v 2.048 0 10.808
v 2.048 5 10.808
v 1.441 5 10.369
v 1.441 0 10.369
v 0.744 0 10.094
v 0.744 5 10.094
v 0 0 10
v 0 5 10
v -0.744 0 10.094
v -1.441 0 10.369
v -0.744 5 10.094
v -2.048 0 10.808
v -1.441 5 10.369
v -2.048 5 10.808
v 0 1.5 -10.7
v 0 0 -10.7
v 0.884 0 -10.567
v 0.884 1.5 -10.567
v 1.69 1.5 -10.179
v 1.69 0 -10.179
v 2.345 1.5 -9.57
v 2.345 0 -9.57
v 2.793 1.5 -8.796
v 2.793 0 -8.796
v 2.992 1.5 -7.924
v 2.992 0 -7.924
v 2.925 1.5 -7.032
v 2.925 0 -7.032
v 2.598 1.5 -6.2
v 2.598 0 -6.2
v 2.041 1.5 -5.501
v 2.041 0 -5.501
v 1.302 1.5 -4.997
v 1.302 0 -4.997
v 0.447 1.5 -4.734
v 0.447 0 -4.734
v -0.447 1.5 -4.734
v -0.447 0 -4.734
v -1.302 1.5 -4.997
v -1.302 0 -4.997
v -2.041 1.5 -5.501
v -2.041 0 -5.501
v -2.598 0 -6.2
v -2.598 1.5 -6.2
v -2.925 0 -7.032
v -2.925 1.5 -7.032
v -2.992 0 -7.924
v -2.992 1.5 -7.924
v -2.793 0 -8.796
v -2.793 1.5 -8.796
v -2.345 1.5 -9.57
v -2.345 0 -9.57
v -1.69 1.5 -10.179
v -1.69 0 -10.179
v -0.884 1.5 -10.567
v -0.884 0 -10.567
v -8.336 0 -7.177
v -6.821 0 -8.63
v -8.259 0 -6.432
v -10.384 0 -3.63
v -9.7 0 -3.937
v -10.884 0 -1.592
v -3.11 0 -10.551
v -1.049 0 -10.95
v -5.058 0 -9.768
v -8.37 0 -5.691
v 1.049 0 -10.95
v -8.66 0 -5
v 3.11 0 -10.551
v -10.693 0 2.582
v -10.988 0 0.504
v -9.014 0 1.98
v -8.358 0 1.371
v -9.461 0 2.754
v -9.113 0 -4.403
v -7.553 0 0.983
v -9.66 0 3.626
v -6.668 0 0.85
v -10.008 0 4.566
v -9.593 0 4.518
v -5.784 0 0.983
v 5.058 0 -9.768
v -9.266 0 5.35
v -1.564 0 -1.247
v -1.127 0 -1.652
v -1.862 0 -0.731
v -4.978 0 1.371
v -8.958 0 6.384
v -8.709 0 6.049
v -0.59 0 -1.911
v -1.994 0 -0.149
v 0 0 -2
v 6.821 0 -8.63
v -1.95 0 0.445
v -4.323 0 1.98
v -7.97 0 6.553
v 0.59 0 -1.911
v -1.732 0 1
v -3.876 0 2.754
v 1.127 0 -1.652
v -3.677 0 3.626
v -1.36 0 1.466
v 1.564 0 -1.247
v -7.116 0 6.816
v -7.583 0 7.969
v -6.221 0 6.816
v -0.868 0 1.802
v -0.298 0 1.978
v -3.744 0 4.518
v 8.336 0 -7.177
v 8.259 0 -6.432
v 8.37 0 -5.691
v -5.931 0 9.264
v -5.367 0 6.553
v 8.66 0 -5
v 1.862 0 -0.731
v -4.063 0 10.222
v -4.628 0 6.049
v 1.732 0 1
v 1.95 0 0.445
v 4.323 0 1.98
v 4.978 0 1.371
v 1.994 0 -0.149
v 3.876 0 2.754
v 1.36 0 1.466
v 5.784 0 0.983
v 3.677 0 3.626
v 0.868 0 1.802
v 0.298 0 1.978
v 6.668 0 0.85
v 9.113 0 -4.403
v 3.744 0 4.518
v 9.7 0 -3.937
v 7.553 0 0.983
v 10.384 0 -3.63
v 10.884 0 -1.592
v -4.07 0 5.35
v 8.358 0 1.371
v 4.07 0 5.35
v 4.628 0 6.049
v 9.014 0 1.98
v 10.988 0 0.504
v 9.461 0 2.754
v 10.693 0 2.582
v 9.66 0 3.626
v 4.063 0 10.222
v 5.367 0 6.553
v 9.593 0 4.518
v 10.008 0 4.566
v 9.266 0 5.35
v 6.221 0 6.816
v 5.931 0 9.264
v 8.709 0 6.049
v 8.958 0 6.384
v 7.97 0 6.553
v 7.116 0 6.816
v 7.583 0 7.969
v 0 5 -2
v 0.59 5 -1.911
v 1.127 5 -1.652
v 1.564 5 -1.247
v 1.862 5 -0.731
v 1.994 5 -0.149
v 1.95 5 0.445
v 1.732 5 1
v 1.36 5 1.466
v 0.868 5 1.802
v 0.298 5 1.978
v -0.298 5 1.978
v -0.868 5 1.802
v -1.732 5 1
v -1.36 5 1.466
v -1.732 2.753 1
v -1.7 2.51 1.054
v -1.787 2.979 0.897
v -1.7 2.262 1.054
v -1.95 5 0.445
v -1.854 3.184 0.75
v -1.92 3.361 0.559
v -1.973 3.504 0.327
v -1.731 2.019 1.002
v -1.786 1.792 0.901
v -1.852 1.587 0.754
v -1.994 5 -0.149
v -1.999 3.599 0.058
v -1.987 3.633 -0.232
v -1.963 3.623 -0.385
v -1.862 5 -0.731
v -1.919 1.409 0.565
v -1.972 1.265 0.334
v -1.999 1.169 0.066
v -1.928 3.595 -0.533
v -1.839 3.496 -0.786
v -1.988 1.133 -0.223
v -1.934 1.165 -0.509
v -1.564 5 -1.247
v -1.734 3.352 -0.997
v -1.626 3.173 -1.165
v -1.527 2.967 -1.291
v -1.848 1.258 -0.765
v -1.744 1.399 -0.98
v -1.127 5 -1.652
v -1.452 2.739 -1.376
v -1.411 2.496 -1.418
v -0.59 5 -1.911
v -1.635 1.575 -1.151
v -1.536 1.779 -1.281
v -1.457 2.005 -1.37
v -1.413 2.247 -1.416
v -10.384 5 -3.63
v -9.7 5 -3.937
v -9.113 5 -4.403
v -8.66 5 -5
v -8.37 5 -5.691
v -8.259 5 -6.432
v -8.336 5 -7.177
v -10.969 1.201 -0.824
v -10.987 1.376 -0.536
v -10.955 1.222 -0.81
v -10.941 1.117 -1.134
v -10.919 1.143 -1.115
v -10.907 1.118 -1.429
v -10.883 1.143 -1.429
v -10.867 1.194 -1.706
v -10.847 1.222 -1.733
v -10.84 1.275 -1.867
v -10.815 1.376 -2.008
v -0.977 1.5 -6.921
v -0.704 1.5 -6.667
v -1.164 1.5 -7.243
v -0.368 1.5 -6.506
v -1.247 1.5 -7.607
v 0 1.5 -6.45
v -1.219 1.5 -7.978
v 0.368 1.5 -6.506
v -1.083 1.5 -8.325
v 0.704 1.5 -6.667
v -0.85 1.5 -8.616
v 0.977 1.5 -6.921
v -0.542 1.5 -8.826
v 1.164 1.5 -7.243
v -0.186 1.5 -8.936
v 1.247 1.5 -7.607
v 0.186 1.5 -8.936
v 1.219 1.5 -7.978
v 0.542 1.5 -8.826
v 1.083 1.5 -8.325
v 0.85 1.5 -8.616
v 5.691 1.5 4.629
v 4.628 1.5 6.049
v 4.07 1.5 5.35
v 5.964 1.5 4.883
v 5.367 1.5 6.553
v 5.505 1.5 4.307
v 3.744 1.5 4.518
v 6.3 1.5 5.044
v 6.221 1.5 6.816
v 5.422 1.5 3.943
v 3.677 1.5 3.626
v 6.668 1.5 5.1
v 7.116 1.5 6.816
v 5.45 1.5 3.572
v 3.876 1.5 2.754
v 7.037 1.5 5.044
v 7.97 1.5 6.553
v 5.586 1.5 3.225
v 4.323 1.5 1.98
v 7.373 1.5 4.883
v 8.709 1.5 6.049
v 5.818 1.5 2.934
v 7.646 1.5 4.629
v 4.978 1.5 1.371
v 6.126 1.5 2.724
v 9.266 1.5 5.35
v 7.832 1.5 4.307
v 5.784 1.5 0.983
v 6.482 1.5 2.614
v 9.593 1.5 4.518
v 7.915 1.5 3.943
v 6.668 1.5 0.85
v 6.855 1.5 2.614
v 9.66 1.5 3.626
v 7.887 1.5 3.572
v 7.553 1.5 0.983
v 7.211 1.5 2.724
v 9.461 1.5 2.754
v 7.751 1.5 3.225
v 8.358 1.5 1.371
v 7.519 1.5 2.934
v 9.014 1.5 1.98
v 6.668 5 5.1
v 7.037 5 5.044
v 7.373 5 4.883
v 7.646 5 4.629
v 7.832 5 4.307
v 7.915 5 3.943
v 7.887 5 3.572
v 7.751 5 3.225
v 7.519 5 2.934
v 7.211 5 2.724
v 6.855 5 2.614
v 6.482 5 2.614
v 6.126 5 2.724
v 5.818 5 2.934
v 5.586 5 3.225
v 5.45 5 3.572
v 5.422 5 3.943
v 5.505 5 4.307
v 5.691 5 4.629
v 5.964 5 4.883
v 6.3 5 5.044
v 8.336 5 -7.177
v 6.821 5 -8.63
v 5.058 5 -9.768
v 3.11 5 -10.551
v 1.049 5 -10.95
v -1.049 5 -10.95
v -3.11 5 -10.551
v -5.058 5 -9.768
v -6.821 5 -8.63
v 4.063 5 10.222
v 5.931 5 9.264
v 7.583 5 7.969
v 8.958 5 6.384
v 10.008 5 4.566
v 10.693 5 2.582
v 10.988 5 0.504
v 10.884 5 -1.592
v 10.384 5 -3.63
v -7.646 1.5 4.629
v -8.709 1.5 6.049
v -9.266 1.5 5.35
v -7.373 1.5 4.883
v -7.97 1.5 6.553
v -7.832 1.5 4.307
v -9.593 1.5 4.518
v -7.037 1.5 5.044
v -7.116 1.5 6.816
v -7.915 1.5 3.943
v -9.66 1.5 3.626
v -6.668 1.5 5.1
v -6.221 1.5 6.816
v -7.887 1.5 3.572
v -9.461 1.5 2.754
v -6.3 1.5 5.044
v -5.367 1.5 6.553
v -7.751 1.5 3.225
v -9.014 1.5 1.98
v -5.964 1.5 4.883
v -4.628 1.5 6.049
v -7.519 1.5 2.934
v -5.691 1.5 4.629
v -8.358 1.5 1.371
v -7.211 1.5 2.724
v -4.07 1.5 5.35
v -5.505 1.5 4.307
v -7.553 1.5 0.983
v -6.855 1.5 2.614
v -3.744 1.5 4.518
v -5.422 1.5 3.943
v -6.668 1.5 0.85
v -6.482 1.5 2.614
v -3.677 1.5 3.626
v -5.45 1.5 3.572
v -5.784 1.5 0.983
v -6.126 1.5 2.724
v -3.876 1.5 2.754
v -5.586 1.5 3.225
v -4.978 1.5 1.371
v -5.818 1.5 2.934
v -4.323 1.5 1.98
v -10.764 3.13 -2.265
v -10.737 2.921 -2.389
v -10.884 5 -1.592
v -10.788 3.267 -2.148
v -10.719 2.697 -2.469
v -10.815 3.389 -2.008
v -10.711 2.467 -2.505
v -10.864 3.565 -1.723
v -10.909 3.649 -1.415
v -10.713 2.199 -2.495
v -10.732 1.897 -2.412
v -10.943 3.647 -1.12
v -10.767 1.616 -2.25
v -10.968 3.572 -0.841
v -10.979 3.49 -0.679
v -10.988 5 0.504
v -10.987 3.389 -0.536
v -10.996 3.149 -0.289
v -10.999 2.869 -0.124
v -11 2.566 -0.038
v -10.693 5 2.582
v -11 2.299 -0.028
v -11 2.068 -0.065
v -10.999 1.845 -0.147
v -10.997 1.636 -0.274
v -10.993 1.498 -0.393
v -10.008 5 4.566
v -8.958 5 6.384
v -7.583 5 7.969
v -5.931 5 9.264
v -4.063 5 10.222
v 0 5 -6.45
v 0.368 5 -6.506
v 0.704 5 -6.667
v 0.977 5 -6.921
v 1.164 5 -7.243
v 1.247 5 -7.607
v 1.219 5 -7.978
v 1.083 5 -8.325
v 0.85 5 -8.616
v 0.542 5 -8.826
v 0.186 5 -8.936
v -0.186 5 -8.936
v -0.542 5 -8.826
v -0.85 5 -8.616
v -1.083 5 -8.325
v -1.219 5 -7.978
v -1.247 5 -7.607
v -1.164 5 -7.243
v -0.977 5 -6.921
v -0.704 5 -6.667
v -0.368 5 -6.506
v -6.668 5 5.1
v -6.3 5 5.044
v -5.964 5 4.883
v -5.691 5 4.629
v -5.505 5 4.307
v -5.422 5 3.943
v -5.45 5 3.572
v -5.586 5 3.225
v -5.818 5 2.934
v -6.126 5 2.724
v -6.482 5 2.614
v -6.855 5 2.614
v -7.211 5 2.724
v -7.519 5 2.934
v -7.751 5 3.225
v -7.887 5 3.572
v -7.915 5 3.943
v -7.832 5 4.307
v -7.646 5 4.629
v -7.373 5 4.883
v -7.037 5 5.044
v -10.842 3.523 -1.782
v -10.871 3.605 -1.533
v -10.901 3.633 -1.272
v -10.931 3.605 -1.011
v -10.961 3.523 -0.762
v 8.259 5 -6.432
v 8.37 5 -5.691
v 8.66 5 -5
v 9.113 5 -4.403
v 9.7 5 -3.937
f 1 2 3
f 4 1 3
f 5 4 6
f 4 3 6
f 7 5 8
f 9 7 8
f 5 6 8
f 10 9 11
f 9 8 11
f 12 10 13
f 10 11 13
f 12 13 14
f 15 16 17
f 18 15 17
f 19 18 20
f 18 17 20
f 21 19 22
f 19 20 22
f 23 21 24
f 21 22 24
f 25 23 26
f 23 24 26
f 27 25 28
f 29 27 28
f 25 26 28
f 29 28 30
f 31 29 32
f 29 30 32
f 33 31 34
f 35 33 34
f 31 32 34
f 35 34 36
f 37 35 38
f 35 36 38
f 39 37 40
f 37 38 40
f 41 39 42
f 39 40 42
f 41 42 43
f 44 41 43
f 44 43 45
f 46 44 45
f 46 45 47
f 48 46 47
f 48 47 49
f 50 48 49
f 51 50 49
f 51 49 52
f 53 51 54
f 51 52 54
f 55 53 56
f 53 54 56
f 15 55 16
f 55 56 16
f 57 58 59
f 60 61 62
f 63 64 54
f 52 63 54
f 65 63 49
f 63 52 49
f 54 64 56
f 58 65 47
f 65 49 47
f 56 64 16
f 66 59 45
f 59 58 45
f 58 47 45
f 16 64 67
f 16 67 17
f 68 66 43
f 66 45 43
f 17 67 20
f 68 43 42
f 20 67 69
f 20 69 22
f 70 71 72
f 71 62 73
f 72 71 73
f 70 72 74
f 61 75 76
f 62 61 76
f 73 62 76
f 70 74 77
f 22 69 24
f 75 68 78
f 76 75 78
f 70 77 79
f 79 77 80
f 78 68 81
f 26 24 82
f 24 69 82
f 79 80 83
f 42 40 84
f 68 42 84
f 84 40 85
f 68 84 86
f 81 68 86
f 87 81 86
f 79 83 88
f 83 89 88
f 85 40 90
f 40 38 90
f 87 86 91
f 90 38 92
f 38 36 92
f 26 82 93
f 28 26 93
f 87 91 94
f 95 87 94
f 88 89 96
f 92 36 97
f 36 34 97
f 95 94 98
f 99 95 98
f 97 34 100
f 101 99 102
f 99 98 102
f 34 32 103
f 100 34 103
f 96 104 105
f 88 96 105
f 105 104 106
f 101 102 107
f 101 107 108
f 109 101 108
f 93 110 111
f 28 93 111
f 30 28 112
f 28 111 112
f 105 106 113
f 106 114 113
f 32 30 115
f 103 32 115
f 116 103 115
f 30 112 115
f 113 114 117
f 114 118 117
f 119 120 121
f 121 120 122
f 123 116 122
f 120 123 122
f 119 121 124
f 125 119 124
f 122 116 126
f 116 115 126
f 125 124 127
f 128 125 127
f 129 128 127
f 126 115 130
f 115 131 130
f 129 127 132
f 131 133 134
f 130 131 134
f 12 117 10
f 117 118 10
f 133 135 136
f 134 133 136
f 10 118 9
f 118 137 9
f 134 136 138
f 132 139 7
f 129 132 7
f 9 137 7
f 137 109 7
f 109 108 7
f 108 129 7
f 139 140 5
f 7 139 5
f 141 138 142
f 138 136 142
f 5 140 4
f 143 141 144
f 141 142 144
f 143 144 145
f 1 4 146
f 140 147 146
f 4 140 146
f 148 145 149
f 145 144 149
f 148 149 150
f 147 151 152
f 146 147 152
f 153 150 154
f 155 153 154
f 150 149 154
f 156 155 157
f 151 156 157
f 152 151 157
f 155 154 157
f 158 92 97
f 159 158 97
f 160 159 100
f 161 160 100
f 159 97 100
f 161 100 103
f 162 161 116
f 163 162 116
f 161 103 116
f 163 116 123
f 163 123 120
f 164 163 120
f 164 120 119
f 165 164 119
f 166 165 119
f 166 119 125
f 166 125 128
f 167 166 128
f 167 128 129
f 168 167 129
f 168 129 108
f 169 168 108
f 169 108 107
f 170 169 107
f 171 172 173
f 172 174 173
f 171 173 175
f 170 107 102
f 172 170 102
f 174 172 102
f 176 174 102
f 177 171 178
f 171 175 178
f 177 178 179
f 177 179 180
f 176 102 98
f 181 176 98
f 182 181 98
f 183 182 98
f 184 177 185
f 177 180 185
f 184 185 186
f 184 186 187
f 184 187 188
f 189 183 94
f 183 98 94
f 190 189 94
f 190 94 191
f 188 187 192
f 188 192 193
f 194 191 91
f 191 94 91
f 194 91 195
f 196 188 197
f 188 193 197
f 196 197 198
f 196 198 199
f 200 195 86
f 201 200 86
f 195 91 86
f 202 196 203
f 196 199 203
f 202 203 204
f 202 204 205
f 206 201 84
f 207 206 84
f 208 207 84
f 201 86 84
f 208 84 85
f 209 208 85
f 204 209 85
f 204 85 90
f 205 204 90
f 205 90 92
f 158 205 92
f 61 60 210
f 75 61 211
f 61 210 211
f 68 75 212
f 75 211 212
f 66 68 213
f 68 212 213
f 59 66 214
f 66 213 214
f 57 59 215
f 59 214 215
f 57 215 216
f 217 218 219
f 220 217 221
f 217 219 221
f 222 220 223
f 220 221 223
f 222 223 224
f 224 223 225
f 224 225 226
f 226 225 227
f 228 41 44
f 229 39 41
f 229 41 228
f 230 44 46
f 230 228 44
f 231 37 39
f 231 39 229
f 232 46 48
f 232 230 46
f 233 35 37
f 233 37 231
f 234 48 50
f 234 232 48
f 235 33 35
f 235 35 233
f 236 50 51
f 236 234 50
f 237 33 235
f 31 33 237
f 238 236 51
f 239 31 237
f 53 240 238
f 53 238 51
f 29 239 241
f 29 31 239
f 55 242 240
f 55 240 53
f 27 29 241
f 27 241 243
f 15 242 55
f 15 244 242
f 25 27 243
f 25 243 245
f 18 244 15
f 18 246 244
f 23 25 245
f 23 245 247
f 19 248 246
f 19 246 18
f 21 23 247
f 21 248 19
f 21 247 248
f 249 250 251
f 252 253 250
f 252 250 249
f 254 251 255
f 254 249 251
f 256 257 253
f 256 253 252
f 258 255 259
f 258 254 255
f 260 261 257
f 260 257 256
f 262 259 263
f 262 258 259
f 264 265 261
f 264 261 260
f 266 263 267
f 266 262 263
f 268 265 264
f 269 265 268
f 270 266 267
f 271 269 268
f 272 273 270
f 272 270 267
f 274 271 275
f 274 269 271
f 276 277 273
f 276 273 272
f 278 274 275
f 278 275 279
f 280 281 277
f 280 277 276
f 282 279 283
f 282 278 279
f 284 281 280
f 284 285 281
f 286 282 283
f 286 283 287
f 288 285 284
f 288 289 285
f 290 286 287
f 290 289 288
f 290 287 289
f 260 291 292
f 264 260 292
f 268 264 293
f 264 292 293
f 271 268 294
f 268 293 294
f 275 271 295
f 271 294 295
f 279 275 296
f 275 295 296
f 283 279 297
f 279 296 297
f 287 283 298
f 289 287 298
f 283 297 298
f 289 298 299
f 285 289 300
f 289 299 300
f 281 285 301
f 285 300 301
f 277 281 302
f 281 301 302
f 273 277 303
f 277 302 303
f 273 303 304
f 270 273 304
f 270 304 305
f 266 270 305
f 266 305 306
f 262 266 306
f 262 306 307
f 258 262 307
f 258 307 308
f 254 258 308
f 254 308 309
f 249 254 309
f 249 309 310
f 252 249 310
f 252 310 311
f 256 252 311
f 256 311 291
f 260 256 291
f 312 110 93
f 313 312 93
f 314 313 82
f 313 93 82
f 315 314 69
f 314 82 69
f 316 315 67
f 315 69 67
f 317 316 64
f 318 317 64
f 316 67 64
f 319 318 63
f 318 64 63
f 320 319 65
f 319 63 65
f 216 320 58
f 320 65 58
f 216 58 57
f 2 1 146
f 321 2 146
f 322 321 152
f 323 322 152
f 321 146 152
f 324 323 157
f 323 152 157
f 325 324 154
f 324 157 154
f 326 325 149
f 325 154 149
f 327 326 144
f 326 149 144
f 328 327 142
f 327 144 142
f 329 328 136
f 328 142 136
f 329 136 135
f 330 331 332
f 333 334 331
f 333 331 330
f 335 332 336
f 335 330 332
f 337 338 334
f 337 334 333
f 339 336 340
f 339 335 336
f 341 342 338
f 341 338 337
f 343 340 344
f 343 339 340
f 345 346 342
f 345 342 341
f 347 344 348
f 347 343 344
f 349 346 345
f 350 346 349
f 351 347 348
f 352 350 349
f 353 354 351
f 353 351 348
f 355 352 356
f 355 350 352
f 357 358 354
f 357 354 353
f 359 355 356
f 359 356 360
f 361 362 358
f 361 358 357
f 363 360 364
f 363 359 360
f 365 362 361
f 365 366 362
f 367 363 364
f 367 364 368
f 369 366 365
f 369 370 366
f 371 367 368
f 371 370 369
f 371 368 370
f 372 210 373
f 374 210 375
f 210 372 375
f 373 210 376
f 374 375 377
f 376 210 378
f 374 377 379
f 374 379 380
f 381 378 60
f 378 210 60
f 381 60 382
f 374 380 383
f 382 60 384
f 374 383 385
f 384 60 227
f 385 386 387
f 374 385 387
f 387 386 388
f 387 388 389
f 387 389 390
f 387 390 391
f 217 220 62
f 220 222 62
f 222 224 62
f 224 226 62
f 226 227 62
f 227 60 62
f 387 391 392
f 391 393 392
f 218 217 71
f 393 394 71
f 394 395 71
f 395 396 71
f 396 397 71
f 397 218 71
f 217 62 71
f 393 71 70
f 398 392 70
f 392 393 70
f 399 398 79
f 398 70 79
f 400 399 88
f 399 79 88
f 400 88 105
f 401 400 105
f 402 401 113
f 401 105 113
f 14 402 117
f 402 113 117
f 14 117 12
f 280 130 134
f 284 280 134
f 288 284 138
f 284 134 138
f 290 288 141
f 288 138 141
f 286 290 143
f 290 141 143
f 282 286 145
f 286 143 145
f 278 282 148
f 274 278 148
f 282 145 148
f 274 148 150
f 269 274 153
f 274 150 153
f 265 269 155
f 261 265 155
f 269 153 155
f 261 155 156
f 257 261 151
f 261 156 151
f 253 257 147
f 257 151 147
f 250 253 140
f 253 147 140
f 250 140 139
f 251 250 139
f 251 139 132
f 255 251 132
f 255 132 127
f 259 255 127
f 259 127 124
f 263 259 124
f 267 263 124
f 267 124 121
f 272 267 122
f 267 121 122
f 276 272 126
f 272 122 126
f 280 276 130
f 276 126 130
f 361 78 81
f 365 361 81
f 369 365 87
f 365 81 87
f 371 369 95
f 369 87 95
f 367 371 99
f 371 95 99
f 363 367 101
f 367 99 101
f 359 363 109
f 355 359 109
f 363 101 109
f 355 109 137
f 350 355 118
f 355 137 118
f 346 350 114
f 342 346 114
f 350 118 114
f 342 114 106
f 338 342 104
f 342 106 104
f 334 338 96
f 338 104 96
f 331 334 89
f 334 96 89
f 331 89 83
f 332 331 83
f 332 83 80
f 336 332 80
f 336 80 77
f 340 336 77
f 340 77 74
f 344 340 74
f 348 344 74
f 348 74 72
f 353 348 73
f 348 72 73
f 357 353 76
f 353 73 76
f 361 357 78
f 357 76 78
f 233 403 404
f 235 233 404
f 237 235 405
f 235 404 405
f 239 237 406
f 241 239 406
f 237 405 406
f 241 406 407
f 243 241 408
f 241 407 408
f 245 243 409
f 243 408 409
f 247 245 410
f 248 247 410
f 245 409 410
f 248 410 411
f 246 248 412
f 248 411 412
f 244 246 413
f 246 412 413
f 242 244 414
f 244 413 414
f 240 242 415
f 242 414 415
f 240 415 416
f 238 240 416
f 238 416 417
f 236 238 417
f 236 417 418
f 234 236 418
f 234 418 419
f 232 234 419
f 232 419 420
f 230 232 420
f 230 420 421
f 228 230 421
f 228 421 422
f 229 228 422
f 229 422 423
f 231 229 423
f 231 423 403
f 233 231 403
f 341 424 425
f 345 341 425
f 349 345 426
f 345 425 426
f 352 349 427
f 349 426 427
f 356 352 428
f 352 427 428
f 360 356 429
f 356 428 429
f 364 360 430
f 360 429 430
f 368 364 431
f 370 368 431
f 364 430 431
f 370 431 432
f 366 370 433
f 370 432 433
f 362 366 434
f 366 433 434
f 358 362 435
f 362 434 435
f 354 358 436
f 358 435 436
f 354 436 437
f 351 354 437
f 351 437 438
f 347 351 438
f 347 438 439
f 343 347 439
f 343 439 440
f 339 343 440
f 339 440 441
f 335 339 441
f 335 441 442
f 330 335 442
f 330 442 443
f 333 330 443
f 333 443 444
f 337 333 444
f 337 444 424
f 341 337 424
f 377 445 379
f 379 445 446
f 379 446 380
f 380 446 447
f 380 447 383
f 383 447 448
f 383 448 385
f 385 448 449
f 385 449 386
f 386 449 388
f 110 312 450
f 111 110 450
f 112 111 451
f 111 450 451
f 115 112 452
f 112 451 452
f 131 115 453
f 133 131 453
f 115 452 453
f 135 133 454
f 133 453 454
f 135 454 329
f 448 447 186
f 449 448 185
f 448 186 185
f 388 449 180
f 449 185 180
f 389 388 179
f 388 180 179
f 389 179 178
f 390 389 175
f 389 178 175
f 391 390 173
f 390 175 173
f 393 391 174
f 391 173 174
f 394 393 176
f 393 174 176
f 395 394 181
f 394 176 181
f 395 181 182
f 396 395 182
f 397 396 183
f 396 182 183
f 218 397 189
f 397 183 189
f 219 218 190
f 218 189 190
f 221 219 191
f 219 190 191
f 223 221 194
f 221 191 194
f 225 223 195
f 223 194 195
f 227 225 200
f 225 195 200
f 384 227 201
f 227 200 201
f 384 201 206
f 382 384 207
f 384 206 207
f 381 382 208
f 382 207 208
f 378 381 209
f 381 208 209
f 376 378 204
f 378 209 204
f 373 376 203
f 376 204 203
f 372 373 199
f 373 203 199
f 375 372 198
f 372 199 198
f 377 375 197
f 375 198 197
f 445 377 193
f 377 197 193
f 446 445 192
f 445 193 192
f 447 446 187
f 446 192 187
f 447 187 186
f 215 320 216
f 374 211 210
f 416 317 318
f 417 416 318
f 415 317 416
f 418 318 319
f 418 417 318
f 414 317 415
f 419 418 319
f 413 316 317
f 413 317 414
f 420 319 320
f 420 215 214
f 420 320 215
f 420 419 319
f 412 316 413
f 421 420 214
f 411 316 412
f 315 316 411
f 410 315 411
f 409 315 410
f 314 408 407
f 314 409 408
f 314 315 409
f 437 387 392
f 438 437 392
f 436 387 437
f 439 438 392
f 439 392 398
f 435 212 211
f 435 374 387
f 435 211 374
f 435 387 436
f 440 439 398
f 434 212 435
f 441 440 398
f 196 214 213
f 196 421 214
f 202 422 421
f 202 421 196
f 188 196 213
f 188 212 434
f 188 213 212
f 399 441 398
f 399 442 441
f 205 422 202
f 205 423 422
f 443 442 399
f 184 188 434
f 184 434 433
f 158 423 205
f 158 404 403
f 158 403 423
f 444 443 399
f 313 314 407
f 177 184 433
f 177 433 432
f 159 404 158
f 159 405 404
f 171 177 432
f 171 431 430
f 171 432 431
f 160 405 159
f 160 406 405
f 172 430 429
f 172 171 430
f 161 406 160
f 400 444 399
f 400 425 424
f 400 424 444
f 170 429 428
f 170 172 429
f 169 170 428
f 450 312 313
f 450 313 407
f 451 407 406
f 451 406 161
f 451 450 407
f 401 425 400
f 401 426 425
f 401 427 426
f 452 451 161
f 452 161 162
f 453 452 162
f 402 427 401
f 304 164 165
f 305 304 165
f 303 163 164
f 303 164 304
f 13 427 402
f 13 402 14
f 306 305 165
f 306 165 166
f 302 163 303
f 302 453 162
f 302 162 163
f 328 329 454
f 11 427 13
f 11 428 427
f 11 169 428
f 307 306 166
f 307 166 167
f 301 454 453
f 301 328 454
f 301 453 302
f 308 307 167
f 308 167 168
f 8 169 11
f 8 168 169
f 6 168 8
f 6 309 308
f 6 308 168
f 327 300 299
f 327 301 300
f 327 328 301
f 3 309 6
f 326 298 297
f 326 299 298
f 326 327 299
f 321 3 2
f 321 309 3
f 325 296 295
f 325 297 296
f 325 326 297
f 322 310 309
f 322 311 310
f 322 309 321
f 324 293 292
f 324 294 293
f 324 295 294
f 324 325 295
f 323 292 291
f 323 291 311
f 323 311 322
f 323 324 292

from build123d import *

# Parameters (mm, degrees)
ESBO_O1_R                = 11
RESSALTO_EXTRUS_O1_DEPTH = 5
ESBO_O3_R                = 1.25
CORTE_EXTRUS_O1_DEPTH    = 10.095971114
ESBO_O22_R               = 3
CORTE_EXTRUS_O6_DEPTH    = 5.5
ESBO_O23_R               = 3
CORTE_EXTRUS_O7_DEPTH    = 1.5
ESBO_O27_R               = 2
CORTE_EXTRUS_O8_DEPTH    = 10


# Read off the part's stored shape, not the designer's step: Broca de rosquear para tarraxa de M3x0.52
with BuildPart() as part:
    # Esboço1 → Ressalto-extrusão1 (new body)
    with BuildSketch(Plane(origin=(0, 0, 0), x_dir=(1, 0, 0), z_dir=(0, 1, 0))):
        with Locations(Location((0, 0, 0), (0, 0, 270))):
            Circle(ESBO_O1_R)
    extrude(amount=RESSALTO_EXTRUS_O1_DEPTH)

    # Esboço3 → Corte-extrusão1 (cut)
    with BuildSketch(Plane(origin=(0, 5, 0), x_dir=(1, 0, 0), z_dir=(0, 1, 0))):
        with Locations(Location((0, 7.7, 0), (0, 0, 270))):
            Circle(ESBO_O3_R)
        with Locations(Location((6.668395609, -3.85, 0), (0, 0, 270))):
            Circle(ESBO_O3_R)
        with Locations(Location((-6.668395609, -3.85, 0), (0, 0, 270))):
            Circle(ESBO_O3_R)
    extrude(amount=-CORTE_EXTRUS_O1_DEPTH, mode=Mode.SUBTRACT)

    # Esboço22 → Corte-extrusão6 (cut)
    with BuildSketch(Plane(origin=(0, 5, 0), x_dir=(1, 0, 0), z_dir=(0, 1, 0))):
        with Locations((-11.258330249, 6.5)):
            Circle(ESBO_O22_R)
        with Locations((0, -13)):
            Circle(ESBO_O22_R)
        with Locations((11.258330249, 6.5)):
            Circle(ESBO_O22_R)
    extrude(amount=-CORTE_EXTRUS_O6_DEPTH, mode=Mode.SUBTRACT)

    # Esboço23 → Corte-extrusão7 (cut)
    with BuildSketch(Plane(origin=(0, 0, 0), x_dir=(-1, 0, 0), z_dir=(0, -1, 0))):
        with Locations(Location((-6.668395609, -3.85, 0), (0, 0, 90))):
            Circle(ESBO_O23_R)
        with Locations(Location((6.668395609, -3.85, 0), (0, 0, 90))):
            Circle(ESBO_O23_R)
        with Locations(Location((0, 7.7, 0), (0, 0, 90))):
            Circle(ESBO_O23_R)
    extrude(amount=-CORTE_EXTRUS_O7_DEPTH, mode=Mode.SUBTRACT)

    # Esboço27 → Corte-extrusão8 (cut)
    with BuildSketch(Plane.XZ):
        with Locations(Location((0, 0, 0), (0, 0, 270))):
            Circle(ESBO_O27_R)
    extrude(amount=-CORTE_EXTRUS_O8_DEPTH, mode=Mode.SUBTRACT)

    # Broca de rosquear para tarraxa de M3 2 → Broca de rosquear para tarraxa de M3x0.52 (revolve, cut)
    with BuildSketch(Plane(origin=(0, 2.382860609, 0), x_dir=(0, 1, 0), z_dir=(0.11587924714300103, 0, -0.9932633085348372))):
        Polygon((0, -11.00002072), (1.275019909, -11.000019909), (1.249997575, -10.974997575), (1.25, -1.561025492), (0, -1.561025492), align=None)
    revolve(axis=Axis((0, 2.382860609, 0), (0.9932633085348372, 0, 0.11587924714300103)), mode=Mode.SUBTRACT)


solid = part.part
